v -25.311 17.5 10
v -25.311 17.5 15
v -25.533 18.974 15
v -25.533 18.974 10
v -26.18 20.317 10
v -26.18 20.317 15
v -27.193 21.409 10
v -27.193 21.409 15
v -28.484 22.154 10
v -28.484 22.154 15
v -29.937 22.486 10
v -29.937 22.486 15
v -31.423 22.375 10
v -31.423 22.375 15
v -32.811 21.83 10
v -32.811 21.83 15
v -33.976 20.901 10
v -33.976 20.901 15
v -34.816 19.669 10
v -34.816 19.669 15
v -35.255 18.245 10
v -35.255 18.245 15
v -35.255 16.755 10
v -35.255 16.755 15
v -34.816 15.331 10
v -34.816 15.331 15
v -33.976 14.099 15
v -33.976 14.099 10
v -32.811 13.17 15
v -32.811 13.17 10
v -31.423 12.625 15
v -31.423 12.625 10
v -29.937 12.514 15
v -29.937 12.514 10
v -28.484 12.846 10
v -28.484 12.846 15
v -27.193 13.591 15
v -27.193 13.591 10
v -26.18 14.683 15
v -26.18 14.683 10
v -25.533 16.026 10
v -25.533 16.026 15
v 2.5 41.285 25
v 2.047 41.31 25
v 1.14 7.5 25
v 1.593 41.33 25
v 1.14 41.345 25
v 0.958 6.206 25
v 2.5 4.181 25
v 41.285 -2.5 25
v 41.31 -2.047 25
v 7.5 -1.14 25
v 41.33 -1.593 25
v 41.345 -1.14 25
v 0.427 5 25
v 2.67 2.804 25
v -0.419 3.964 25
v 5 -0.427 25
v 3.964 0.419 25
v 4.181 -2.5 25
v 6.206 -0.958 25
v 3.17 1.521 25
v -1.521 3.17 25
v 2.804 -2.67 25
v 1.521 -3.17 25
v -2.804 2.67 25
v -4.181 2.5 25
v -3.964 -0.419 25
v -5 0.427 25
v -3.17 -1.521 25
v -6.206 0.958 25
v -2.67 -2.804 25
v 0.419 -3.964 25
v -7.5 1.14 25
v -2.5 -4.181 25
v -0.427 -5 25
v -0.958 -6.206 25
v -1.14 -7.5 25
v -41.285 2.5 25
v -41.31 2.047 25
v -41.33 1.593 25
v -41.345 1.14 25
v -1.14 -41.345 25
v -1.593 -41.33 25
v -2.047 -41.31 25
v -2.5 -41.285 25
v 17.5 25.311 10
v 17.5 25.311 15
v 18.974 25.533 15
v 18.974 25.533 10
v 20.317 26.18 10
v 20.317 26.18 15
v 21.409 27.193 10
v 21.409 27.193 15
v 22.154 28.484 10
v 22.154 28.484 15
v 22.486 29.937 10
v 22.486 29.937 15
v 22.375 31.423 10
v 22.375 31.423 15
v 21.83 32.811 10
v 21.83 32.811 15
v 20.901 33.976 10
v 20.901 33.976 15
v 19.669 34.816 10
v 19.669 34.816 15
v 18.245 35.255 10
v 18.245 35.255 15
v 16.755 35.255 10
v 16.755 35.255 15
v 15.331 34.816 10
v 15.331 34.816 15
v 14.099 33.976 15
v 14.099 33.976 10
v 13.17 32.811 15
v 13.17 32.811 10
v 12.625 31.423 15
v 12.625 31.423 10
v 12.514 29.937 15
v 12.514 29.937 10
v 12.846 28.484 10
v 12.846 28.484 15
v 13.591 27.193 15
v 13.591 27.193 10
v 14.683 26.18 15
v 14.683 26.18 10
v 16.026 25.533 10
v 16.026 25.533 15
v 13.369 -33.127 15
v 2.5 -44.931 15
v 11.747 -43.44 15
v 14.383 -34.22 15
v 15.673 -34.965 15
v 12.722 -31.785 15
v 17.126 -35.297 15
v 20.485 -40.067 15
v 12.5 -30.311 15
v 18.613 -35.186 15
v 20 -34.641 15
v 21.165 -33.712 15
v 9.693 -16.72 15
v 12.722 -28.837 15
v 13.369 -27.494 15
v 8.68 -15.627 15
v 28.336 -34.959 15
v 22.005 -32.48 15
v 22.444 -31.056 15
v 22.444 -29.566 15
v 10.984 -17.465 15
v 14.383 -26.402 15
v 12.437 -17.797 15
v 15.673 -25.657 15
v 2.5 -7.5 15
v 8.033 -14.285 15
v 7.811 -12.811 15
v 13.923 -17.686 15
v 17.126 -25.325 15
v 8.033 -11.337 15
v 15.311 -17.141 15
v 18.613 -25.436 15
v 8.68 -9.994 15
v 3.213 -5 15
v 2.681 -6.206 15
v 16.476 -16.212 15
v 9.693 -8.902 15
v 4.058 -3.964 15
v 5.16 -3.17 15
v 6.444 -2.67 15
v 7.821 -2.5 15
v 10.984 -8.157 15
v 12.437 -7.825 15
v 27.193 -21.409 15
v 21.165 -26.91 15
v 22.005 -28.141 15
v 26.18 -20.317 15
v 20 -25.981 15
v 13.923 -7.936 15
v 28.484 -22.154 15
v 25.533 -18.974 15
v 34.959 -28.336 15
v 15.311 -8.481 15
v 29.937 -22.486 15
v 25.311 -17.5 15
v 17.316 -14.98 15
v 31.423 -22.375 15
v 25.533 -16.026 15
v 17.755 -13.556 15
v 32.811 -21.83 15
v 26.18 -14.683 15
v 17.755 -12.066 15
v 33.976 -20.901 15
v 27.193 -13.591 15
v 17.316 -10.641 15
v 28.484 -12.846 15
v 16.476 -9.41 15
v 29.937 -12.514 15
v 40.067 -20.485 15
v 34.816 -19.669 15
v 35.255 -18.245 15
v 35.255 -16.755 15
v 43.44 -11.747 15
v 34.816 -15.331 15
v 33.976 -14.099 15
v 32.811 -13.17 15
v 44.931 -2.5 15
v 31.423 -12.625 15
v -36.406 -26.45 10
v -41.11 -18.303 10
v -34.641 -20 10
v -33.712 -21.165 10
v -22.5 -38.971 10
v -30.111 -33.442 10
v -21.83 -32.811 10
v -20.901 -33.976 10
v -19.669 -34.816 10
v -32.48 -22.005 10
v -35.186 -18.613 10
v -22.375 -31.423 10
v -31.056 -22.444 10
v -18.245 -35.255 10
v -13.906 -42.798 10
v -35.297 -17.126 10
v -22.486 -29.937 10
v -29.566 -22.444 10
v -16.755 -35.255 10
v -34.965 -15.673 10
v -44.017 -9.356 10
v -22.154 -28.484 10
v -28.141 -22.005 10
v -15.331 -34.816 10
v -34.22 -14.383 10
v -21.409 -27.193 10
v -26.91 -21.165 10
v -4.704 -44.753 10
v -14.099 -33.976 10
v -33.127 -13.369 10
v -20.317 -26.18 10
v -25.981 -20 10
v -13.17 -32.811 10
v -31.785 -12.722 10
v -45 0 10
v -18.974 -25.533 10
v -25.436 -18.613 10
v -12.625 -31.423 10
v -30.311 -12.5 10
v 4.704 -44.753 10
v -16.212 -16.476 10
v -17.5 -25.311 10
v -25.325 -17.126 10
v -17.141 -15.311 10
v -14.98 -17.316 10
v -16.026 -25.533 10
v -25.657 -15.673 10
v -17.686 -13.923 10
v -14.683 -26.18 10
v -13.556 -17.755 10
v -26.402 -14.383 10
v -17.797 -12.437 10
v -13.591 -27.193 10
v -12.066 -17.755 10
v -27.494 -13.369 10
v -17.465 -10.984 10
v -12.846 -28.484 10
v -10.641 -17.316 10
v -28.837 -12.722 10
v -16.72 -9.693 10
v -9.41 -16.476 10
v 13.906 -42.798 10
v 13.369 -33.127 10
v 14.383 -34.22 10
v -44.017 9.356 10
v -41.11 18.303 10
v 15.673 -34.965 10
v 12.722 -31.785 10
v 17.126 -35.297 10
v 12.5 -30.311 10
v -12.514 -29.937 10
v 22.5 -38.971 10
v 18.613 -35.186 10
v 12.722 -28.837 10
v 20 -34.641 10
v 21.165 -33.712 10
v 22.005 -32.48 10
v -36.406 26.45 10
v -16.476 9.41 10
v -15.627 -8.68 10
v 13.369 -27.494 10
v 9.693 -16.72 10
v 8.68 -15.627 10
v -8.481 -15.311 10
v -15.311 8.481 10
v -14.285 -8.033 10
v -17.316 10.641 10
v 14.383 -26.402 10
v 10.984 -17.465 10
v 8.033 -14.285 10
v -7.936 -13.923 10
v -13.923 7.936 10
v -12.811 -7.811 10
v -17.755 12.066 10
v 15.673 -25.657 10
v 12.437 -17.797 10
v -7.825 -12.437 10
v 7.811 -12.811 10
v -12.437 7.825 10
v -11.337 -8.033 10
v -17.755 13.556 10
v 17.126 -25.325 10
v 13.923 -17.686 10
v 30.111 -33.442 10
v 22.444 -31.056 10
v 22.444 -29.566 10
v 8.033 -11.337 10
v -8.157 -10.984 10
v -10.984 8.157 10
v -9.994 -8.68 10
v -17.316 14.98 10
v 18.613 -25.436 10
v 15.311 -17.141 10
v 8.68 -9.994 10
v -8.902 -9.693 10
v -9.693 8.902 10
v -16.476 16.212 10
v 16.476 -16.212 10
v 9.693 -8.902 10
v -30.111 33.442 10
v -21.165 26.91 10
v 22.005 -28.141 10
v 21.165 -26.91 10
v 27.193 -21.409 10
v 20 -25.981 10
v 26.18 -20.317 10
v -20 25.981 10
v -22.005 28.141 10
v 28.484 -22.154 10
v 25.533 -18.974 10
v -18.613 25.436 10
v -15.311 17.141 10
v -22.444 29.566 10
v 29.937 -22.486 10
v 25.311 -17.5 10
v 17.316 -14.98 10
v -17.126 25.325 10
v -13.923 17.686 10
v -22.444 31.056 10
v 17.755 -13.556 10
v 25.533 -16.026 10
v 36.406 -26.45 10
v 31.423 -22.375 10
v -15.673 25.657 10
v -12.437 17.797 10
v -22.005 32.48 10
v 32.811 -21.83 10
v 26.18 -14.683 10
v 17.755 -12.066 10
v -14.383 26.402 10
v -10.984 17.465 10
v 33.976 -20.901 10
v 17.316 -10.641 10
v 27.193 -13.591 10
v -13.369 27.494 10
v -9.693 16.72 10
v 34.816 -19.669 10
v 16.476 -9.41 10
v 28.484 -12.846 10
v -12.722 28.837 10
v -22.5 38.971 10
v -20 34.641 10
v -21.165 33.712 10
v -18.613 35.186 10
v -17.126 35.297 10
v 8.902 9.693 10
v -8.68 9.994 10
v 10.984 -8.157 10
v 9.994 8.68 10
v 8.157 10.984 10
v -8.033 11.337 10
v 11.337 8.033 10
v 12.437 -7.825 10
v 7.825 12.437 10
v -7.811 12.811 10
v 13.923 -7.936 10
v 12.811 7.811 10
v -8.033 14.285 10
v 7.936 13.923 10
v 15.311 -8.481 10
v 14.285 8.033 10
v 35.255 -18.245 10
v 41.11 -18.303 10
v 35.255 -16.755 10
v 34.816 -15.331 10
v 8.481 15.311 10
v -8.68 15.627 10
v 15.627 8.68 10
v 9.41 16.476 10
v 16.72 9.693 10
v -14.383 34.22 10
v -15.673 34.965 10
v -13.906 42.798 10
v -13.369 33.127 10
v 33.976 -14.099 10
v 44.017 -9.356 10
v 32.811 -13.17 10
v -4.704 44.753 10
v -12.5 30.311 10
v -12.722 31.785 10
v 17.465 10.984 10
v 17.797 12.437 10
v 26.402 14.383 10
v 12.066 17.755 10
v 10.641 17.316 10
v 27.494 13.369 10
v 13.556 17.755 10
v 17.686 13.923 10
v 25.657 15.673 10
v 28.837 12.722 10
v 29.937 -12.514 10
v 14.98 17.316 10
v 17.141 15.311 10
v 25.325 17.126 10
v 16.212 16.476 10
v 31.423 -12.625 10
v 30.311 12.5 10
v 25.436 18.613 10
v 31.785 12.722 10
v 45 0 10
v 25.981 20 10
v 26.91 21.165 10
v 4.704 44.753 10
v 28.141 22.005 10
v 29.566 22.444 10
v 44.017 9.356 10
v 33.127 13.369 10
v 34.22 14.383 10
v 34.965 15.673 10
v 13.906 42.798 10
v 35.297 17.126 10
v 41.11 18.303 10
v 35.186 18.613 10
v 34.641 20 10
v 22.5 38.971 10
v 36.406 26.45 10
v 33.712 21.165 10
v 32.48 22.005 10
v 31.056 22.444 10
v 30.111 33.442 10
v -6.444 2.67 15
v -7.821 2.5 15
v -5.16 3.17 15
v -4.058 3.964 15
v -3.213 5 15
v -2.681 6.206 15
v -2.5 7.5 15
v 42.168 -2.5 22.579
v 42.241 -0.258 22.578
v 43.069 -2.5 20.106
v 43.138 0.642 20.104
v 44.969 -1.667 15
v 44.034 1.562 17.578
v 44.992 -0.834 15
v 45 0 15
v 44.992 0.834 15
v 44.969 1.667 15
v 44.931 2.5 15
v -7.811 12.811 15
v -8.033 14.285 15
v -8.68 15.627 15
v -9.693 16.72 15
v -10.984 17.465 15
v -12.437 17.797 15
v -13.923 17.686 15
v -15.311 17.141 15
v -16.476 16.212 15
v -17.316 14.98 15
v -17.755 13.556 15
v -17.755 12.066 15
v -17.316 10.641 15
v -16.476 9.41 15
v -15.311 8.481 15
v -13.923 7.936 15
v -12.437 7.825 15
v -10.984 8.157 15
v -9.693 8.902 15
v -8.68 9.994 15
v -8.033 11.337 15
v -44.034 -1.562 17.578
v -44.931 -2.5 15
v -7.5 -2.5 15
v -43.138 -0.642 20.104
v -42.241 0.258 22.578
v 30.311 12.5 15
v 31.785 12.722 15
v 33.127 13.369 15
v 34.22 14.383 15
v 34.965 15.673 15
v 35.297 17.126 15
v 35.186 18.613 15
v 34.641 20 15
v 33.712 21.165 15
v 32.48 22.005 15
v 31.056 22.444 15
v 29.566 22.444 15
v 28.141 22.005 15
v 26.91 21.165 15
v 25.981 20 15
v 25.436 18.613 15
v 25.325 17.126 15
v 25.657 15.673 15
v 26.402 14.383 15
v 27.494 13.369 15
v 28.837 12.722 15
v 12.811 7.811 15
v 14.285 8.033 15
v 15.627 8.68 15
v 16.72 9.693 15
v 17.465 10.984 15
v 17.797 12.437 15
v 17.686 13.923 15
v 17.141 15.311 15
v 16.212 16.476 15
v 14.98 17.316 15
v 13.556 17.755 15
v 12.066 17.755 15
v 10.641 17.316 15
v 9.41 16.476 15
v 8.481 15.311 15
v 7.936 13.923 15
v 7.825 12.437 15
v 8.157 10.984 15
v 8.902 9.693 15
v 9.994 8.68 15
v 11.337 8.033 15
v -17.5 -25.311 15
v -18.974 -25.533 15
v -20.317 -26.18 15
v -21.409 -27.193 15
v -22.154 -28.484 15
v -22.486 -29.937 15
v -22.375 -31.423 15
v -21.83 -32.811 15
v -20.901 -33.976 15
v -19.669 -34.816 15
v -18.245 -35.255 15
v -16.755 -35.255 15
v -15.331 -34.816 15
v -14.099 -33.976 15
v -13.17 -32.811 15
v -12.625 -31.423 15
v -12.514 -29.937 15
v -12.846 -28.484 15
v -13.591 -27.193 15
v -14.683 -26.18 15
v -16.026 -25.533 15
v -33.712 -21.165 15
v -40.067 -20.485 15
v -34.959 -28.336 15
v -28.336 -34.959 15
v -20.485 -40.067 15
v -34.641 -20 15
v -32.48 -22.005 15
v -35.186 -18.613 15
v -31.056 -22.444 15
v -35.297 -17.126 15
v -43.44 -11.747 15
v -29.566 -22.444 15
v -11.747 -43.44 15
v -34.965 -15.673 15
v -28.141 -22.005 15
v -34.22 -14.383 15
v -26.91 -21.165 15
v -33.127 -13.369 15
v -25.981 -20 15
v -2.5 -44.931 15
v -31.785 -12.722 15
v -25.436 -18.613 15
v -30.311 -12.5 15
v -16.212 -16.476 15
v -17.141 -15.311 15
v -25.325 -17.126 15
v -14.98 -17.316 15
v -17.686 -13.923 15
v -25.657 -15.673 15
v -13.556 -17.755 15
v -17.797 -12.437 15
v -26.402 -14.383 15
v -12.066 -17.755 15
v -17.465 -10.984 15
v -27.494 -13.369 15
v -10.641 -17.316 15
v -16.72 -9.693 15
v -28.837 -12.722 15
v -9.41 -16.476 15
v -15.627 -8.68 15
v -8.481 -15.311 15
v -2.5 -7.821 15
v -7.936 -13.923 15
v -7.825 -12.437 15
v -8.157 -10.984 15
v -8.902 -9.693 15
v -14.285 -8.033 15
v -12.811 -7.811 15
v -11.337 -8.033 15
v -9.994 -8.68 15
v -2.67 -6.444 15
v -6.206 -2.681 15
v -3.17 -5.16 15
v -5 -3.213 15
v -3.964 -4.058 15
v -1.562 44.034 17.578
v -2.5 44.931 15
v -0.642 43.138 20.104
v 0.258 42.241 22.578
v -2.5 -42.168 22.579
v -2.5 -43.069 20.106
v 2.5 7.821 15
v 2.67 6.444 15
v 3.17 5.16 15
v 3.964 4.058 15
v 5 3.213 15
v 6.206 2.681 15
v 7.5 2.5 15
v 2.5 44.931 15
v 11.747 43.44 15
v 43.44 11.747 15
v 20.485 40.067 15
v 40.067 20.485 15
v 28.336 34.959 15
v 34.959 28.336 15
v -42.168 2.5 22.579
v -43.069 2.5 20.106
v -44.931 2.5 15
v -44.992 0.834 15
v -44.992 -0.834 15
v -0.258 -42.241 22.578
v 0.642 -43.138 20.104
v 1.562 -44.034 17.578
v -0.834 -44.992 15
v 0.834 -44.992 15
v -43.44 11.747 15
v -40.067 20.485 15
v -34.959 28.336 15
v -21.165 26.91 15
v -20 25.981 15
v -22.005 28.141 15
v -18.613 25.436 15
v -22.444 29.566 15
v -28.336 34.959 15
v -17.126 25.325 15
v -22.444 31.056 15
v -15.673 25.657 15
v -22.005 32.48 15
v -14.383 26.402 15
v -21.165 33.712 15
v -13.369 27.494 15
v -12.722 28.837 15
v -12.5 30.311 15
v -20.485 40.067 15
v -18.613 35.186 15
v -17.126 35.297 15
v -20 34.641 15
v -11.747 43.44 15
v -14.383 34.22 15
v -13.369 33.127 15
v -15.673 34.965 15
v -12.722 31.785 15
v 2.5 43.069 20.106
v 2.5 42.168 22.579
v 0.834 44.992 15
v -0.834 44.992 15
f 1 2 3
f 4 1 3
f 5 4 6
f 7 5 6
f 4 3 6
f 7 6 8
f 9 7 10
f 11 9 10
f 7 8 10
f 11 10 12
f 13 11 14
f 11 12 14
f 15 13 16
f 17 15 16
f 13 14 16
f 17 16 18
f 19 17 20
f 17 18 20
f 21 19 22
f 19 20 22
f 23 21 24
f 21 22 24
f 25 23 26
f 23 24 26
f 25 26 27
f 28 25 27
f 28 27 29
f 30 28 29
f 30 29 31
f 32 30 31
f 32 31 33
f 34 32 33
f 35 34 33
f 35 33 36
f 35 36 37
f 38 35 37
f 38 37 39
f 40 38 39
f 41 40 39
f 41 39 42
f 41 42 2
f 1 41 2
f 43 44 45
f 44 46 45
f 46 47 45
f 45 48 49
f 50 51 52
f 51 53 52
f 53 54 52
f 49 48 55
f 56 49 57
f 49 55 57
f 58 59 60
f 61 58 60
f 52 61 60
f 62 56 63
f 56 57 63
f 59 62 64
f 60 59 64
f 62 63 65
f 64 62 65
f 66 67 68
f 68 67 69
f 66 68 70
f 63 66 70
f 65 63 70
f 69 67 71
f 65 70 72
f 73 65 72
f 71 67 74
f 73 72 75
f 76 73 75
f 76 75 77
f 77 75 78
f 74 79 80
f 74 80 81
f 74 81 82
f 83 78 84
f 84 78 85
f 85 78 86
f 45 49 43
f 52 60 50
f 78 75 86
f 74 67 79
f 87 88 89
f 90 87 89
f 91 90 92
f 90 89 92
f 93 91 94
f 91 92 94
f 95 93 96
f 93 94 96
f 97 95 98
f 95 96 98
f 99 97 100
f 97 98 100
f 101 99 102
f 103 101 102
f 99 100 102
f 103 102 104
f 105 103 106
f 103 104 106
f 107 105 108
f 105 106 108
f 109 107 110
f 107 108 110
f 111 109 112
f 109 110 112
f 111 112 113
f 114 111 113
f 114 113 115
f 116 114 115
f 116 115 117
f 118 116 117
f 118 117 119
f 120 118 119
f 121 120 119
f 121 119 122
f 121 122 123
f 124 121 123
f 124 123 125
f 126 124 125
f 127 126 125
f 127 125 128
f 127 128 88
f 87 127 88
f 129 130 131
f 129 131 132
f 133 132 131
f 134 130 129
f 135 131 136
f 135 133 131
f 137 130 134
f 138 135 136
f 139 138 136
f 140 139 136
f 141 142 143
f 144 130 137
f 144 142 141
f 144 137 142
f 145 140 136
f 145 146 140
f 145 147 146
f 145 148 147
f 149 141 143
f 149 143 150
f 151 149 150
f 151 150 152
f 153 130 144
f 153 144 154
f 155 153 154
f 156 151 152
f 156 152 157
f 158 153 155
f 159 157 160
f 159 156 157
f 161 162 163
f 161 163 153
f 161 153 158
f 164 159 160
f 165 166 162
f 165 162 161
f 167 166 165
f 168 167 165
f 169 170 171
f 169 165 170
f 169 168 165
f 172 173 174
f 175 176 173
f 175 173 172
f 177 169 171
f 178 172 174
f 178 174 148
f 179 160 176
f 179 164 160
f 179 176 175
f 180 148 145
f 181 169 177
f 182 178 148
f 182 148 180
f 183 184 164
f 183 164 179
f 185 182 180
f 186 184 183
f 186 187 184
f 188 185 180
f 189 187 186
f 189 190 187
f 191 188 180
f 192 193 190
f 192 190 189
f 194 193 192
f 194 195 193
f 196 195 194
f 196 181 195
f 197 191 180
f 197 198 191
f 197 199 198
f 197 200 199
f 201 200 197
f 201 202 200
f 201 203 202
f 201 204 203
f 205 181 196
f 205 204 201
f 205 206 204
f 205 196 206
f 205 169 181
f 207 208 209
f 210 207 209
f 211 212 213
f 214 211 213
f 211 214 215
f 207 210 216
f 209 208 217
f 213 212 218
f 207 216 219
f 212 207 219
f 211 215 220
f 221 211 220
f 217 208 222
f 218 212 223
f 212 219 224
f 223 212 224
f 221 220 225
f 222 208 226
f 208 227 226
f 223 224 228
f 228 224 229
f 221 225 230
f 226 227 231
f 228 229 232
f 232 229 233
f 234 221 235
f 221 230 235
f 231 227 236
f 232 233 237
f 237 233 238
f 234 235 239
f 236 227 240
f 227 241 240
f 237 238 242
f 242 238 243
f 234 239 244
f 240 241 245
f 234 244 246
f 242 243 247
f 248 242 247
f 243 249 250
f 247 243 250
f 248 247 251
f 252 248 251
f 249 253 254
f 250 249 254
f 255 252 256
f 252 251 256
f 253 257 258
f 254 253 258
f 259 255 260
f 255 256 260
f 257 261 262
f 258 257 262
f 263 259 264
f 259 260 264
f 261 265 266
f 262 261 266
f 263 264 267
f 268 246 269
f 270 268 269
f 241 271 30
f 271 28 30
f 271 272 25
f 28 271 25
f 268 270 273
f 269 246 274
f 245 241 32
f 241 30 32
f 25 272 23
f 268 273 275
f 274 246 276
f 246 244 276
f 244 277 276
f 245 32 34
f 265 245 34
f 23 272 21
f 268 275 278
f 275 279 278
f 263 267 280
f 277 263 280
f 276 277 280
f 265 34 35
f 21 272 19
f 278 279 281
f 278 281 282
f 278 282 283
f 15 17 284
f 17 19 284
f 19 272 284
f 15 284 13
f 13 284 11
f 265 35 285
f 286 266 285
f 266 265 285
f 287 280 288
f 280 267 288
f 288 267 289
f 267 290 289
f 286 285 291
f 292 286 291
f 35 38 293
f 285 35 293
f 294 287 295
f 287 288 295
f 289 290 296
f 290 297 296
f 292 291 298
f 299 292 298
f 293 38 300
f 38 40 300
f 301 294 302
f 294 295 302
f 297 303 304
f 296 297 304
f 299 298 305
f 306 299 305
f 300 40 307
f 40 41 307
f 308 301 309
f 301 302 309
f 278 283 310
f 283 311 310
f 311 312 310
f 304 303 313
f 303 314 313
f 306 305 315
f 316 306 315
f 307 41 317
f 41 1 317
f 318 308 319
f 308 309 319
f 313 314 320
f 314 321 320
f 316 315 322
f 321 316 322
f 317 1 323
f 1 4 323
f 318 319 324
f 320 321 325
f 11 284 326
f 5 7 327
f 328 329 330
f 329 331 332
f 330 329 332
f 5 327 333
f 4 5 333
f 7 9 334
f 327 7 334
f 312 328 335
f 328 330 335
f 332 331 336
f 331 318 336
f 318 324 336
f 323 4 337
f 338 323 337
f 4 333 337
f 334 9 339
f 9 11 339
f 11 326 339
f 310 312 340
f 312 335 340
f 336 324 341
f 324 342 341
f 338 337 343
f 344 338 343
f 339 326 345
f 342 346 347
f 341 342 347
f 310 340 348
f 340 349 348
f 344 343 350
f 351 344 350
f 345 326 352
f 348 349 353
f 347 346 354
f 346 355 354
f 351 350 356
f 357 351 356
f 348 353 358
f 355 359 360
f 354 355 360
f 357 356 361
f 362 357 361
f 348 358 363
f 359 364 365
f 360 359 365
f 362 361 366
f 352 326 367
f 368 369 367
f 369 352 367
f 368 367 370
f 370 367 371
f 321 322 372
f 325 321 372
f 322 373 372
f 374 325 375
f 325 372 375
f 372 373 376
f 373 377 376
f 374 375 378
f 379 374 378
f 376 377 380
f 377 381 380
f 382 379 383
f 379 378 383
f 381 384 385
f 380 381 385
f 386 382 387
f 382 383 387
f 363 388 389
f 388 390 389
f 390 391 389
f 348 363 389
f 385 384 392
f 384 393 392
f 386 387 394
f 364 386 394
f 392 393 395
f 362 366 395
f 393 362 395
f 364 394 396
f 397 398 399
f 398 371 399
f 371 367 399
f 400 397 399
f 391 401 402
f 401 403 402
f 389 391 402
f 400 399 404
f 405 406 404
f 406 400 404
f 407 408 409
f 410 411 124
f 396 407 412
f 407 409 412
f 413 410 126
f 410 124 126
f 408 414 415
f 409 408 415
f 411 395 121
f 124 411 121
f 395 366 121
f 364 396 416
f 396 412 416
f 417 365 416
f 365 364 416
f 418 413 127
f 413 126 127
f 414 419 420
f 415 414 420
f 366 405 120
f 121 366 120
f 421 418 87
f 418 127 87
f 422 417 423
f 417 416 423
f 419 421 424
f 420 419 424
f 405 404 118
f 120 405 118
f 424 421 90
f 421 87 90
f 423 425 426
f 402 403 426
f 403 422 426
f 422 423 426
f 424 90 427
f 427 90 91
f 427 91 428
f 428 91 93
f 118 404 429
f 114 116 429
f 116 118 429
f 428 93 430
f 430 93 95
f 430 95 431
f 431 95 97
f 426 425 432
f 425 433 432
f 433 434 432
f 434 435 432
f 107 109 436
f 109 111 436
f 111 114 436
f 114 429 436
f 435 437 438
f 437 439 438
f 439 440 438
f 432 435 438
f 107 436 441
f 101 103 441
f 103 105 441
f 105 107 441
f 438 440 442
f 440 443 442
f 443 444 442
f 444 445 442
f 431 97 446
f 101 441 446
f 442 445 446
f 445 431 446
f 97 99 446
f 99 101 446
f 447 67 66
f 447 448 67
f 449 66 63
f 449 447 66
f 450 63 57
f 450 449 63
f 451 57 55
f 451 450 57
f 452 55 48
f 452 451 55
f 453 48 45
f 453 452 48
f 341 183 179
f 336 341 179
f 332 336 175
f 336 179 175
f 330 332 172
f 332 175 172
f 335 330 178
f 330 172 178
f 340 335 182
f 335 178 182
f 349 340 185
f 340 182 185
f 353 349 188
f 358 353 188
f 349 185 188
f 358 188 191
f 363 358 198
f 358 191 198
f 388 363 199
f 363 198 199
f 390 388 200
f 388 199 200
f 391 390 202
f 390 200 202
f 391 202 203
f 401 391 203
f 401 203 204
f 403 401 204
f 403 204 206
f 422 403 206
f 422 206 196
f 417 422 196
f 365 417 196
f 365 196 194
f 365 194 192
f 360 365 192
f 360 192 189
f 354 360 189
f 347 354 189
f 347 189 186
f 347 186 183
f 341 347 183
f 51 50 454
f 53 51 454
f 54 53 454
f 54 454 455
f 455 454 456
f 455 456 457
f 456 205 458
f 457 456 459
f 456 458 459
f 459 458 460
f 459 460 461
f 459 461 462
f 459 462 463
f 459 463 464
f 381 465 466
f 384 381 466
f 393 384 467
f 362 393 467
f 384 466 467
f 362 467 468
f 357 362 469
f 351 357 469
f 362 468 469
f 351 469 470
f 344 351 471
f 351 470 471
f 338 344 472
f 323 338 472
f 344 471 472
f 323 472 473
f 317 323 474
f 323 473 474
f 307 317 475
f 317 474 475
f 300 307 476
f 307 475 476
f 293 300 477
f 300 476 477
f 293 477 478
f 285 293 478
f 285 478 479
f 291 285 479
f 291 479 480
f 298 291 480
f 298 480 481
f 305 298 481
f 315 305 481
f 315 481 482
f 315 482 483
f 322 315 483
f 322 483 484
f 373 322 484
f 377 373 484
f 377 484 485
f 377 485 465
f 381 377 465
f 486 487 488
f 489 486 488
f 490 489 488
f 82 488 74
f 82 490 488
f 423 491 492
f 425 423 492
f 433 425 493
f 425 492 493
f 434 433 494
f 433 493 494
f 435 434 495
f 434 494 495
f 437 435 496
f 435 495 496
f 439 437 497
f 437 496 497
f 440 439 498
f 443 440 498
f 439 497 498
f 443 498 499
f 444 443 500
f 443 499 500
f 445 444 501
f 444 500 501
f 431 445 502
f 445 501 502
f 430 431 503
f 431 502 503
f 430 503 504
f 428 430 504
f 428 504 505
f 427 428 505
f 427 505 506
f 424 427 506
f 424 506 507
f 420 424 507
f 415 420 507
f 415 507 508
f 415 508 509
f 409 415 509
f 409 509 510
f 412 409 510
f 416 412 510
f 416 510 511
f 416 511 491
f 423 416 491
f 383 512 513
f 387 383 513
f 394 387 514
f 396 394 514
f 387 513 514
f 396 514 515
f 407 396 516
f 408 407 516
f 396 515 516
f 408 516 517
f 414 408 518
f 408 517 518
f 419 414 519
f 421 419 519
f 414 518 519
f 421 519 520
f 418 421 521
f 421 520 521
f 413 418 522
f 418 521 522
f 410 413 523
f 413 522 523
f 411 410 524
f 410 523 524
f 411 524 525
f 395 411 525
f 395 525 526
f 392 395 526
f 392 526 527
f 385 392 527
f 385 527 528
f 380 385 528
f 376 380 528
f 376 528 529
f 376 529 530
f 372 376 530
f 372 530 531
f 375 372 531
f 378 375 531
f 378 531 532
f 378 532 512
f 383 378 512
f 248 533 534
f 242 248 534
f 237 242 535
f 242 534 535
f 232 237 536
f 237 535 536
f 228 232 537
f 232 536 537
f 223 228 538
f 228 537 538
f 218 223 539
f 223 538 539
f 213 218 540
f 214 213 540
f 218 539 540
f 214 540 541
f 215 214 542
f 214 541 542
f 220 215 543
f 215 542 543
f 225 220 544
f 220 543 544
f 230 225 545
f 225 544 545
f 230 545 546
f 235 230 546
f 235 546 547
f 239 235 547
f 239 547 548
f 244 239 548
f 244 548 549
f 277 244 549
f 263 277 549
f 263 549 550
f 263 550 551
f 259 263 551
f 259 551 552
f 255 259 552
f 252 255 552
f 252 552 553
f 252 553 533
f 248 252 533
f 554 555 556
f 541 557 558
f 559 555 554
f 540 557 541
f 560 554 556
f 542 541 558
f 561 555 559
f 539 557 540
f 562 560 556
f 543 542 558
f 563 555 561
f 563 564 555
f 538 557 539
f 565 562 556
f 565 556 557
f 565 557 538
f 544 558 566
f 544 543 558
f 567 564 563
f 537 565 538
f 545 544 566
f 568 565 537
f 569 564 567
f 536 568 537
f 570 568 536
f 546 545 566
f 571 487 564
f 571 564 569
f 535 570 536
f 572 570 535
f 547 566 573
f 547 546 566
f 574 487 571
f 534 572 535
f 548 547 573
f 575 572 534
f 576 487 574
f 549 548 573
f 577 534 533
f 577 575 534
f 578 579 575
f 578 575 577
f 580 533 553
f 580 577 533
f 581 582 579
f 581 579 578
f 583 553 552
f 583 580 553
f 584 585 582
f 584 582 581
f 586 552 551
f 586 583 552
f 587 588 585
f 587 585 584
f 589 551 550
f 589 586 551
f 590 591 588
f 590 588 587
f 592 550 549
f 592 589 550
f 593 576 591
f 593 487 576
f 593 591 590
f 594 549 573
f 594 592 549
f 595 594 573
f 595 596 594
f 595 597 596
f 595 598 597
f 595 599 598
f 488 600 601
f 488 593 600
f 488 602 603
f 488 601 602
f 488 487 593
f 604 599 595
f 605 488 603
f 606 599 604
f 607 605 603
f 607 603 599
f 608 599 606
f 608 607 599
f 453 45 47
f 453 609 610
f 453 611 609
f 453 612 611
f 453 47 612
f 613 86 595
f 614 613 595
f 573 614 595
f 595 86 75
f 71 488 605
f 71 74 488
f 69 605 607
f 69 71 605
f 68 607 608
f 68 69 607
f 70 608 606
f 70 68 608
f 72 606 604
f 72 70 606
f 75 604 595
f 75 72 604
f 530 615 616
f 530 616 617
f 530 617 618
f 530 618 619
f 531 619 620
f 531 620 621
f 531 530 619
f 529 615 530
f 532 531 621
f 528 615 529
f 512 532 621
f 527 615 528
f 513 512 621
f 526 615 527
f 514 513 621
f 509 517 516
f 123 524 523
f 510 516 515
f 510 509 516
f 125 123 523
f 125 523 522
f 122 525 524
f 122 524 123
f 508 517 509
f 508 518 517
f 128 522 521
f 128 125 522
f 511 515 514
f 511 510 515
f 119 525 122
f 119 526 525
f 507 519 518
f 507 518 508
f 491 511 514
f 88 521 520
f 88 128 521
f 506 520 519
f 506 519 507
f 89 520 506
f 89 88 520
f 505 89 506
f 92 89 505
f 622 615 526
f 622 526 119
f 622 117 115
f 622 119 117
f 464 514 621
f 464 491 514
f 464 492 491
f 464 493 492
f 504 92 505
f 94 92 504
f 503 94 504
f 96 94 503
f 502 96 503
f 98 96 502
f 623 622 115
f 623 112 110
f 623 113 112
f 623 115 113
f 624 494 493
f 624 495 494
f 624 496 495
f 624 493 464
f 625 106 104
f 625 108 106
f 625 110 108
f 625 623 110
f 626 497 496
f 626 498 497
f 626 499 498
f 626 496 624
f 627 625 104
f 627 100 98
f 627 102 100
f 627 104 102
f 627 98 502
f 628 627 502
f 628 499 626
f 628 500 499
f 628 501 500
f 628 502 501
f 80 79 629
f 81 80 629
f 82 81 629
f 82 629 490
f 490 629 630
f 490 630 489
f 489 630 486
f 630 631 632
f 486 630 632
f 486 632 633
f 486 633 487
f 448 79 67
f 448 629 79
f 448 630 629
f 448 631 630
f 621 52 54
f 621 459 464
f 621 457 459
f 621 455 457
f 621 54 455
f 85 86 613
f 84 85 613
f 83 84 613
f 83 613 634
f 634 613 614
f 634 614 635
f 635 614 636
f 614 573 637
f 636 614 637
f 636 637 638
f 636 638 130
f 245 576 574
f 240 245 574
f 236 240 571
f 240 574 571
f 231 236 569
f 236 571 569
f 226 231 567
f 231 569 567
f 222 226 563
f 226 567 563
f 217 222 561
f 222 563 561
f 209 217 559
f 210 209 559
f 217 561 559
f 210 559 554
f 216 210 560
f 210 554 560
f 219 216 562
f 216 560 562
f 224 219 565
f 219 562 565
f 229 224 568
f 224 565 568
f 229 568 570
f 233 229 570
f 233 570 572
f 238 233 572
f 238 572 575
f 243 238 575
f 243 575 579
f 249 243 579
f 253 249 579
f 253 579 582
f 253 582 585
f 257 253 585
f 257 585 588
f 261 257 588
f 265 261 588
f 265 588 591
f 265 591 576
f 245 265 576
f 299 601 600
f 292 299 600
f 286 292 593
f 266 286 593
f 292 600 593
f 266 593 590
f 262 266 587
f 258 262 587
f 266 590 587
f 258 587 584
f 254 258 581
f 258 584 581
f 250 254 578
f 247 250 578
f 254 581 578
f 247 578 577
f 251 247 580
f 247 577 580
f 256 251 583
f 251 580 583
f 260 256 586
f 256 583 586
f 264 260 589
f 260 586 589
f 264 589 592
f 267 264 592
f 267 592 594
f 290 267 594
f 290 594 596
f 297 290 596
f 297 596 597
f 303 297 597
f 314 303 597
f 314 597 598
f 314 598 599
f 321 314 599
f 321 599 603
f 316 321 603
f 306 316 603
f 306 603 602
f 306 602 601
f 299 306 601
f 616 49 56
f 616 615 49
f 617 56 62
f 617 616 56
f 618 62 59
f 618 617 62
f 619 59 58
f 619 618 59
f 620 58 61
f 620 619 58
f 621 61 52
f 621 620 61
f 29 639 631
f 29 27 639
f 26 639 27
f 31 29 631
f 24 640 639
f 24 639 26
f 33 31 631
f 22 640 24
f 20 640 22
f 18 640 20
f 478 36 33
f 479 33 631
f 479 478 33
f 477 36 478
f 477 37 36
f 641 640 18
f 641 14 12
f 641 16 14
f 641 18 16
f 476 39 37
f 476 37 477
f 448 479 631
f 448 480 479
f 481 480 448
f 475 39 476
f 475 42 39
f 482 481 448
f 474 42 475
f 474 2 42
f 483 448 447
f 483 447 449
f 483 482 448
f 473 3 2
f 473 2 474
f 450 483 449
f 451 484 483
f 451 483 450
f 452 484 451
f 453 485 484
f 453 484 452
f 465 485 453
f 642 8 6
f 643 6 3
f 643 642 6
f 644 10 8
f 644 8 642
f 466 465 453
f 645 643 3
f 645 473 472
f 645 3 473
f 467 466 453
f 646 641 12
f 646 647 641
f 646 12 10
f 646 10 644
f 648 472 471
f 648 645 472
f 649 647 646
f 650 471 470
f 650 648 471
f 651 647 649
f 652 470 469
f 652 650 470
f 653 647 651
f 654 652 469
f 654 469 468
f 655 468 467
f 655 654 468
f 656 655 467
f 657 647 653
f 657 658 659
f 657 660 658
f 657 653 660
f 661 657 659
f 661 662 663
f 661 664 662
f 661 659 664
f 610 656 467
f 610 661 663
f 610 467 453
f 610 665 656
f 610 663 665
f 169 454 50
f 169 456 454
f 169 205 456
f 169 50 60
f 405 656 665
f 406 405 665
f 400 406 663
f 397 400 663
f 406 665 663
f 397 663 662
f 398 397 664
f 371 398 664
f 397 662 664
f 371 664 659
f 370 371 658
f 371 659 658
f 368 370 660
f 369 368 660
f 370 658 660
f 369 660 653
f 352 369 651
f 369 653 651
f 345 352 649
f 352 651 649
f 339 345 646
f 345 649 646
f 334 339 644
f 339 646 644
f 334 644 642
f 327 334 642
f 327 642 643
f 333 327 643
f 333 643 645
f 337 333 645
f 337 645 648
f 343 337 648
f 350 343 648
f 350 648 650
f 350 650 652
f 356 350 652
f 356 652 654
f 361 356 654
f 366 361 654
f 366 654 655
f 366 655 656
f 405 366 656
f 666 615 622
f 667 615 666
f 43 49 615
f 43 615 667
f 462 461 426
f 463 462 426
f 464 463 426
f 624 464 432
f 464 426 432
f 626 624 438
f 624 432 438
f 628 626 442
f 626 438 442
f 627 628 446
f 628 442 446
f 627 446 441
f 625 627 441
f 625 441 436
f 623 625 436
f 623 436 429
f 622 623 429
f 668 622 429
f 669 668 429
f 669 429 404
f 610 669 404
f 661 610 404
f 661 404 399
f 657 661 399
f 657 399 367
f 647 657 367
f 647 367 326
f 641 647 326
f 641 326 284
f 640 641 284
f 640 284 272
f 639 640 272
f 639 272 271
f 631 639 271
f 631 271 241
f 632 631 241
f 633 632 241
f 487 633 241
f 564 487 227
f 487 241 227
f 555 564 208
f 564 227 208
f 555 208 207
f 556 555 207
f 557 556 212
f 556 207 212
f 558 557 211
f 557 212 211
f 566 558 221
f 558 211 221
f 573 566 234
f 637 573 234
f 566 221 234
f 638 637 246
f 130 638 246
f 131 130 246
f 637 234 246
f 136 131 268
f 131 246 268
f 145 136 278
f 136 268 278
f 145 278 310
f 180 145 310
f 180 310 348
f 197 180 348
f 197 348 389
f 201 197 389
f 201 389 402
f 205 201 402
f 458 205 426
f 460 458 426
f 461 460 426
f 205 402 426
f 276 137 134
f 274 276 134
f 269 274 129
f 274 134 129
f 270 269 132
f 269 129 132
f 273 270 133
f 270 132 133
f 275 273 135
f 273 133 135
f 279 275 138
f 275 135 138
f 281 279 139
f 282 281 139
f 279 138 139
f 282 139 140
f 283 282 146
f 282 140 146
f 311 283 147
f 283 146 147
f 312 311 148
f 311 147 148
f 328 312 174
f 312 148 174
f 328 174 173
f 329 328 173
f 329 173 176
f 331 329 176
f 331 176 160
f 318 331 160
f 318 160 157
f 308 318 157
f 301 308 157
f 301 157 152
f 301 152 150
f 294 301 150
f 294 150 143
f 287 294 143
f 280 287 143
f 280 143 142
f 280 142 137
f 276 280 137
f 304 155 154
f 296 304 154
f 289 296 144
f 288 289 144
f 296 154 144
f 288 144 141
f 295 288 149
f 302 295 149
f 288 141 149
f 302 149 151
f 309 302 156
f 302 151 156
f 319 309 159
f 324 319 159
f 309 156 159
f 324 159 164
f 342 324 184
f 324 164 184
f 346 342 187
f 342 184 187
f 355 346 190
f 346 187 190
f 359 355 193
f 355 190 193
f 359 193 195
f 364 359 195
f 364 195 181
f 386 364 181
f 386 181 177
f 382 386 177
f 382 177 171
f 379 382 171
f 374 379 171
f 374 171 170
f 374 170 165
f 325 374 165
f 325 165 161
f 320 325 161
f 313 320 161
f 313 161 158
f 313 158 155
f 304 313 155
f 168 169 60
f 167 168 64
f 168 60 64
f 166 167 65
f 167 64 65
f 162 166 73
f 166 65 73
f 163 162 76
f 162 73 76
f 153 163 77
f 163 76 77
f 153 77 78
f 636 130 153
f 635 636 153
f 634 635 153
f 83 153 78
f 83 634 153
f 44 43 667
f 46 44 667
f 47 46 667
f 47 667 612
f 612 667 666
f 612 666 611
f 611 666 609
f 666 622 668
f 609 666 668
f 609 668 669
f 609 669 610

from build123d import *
from build123d.topology import SkipClean

# Parameters (mm, degrees)
BOSS_EXTRUDE1_START = 10
SKETCH1_R           = 45
BOSS_EXTRUDE1_DEPTH = 5
BOSS_EXTRUDE3_DEPTH = 10
CIRPATTERN1_COUNT   = 2
CIRPATTERN1_ANGLE   = 90
SKETCH5_OUTSIDE_W   = 124.038
SKETCH5_OUTSIDE_H   = 124.038
SKETCH5_OUTSIDE_R   = 45
CUT_EXTRUDE1_DEPTH  = 69.82949949
CHAMFER1_START      = -45
CHAMFER1_2_DEPTH    = 42.5
CHAMFER1_START_2    = 2.5
CHAMFER1_3_DEPTH    = 42.5
CHAMFER1_4_DEPTH    = 42.5
CHAMFER1_5_DEPTH    = 42.5
FILLET1_R           = 5
SKETCH6_R           = 5
CUT_EXTRUDE2_DEPTH  = 65.420493634
CIRPATTERN2_COUNT   = 4


with BuildPart() as part:
    # Sketch1 → Boss-Extrude1 (new body)
    with BuildSketch(Plane(origin=(0, 0, 0), x_dir=(0, 1, 0), z_dir=(0, 0, 1)).offset(BOSS_EXTRUDE1_START)):
        with Locations(Location((0, 0, 0), (0, 0, 270))):
            Circle(SKETCH1_R)
    extrude(amount=BOSS_EXTRUDE1_DEPTH)

    # Sketch4 → Boss-Extrude3 (add)
    with BuildSketch(Plane.XY.offset(15)):
        with BuildLine():
            Line((-2.5, -45), (-2.5, 45))
            ThreePointArc((-2.5, 45), (0, 47.5), (2.5, 45))
            Line((2.5, 45), (2.5, -45))
            ThreePointArc((2.5, -45), (0, -47.5), (-2.5, -45))
        make_face()
    boss_extrude3 = extrude(amount=BOSS_EXTRUDE3_DEPTH)

    # CirPattern1: Boss-Extrude3 ×2 about axis
    cirpattern1_axis = Axis((0, 0, 0), (0, 0, 1))
    for i in range(1, CIRPATTERN1_COUNT):
        add(boss_extrude3.rotate(cirpattern1_axis, i * CIRPATTERN1_ANGLE / (CIRPATTERN1_COUNT - 1)))

    # Sketch5 outside → Cut-Extrude1 (cut, through all)
    with SkipClean():  # the faces are left unmerged after this step: merging them gives an invalid solid
        with BuildSketch(Plane(origin=(0, 0, 10), x_dir=(1, 0, 0), z_dir=(0, 0, -1))):
            Rectangle(SKETCH5_OUTSIDE_W, SKETCH5_OUTSIDE_H)
            with Locations(Location((0, 0, 0), (0, 0, 183.184738537))):
                Circle(SKETCH5_OUTSIDE_R, mode=Mode.SUBTRACT)
        extrude(amount=-CUT_EXTRUDE1_DEPTH, mode=Mode.SUBTRACT)

    # Chamfer1: read off the stored shape, not the designer's step
    # Chamfer1 outline → Chamfer1 (revolve, cut)
    with BuildSketch(Plane.XZ):
        Polygon((45, 25), (41.360297657, 25), (45, 15), align=None)
    revolve(axis=Axis((0, 0, 0), (0, 0, 1)), mode=Mode.SUBTRACT)

    # Chamfer1 2 outline → Chamfer1 2 (cut)
    with BuildSketch(Plane(origin=(0, 0, 0), x_dir=(1, 0, 0), z_dir=(0, 1, 0)).offset(CHAMFER1_START)):
        Polygon((2.5, -15), (-1.139702343, -25), (2.5, -25), align=None)
    extrude(amount=CHAMFER1_2_DEPTH, mode=Mode.SUBTRACT)

    # Chamfer1 3 outline → Chamfer1 3 (cut)
    with BuildSketch(Plane(origin=(0, 0, 0), x_dir=(1, 0, 0), z_dir=(0, 1, 0)).offset(CHAMFER1_START_2)):
        Polygon((-2.5, -15), (-2.5, -25), (1.139702343, -25), align=None)
    extrude(amount=CHAMFER1_3_DEPTH, mode=Mode.SUBTRACT)

    # Chamfer1 4 outline → Chamfer1 4 (cut)
    with BuildSketch(Plane.YZ.offset(CHAMFER1_START)):
        Polygon((-2.5, 15), (1.139702343, 25), (-2.5, 25), align=None)
    extrude(amount=CHAMFER1_4_DEPTH, mode=Mode.SUBTRACT)

    # Chamfer1 5 outline → Chamfer1 5 (cut)
    with BuildSketch(Plane.YZ.offset(CHAMFER1_START_2)):
        Polygon((2.5, 15), (2.5, 25), (-1.139702343, 25), align=None)
    extrude(amount=CHAMFER1_5_DEPTH, mode=Mode.SUBTRACT)

    # Fillet1
    fillet1_edges = [part.edges().sort_by_distance(p)[0] for p in [
        (-0.680148828, 2.5, 20),
        (2.5, 0.680148828, 20),
        (0.680148829, -2.5, 20),
        (-2.5, -0.680148829, 20),
    ]]
    fillet(fillet1_edges, radius=FILLET1_R)

    # Sketch6 → Cut-Extrude2 (cut, through all)
    with BuildSketch(Plane.XY.offset(15)):
        with Locations((-30.310889132, 17.5)):
            Circle(SKETCH6_R)
        with Locations((-17.5, 30.310889132)):
            Circle(SKETCH6_R)
        with Locations((-12.810889132, 12.810889132)):
            Circle(SKETCH6_R)
    cut_extrude2 = extrude(amount=-CUT_EXTRUDE2_DEPTH, mode=Mode.SUBTRACT)

    # CirPattern2: Cut-Extrude2 ×4 about axis
    cirpattern2_axis = Axis((0, 0, 0), (0, 0, 1))
    for i in range(1, CIRPATTERN2_COUNT):
        add(cut_extrude2.rotate(cirpattern2_axis, i * 360 / CIRPATTERN2_COUNT), mode=Mode.SUBTRACT)


solid = part.part
